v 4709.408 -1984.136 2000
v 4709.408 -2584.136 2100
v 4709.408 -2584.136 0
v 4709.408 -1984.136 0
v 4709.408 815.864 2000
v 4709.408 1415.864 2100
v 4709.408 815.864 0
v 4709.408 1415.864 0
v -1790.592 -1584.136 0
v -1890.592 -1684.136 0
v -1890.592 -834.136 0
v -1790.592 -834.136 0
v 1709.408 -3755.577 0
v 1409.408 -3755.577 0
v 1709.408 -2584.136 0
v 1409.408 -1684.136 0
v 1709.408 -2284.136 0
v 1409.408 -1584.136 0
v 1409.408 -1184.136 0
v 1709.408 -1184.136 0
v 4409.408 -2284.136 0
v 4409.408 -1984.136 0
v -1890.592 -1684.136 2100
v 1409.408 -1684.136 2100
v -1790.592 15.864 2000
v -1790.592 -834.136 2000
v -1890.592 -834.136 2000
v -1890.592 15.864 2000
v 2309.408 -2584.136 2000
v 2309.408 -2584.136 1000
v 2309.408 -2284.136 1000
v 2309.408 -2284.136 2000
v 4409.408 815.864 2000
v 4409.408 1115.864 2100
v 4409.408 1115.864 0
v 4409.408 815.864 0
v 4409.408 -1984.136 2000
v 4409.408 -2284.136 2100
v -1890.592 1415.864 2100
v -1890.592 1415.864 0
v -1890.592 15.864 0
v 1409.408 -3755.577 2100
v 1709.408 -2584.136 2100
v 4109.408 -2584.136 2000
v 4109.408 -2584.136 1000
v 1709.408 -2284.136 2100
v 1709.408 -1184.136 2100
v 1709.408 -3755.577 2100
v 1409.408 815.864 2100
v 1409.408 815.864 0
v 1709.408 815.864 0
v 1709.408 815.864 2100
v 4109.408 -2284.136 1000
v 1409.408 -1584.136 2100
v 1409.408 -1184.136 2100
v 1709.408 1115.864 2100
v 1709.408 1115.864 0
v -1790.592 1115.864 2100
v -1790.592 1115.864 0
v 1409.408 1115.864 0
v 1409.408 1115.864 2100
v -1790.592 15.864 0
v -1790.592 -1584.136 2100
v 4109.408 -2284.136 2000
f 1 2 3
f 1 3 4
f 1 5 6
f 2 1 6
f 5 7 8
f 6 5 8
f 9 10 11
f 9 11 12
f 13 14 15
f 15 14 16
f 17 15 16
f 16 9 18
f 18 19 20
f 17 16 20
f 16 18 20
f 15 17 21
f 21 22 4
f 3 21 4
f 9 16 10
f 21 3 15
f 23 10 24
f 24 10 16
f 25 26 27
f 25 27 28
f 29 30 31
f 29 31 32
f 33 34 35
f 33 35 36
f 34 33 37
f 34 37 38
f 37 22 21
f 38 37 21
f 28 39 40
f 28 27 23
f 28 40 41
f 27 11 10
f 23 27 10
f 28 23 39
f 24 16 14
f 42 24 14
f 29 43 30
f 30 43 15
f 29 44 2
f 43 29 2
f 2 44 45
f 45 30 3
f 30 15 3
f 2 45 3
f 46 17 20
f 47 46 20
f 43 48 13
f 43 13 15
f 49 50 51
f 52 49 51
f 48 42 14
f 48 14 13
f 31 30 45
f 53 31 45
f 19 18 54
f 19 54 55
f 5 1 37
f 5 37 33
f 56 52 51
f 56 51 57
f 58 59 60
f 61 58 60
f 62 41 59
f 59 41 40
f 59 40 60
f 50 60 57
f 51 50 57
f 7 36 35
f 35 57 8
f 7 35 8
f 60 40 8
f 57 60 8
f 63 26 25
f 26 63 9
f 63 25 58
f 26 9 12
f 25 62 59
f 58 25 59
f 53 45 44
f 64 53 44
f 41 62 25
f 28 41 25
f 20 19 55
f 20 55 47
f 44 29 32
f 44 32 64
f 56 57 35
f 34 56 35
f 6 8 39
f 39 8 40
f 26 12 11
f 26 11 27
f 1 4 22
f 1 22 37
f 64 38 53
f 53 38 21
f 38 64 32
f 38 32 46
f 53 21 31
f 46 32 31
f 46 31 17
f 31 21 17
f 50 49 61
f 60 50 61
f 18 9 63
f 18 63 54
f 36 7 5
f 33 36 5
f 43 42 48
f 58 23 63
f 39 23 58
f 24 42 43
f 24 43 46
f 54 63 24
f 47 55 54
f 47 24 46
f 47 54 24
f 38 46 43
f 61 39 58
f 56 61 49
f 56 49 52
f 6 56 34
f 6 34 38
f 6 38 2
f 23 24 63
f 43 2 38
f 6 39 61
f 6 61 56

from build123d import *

# Parameters (mm, degrees)
F0_W     = 3200
F0_H     = 2700
F1_DEPTH = 2100
F2_W     = 300
F2_H     = 2000
F3_DEPTH = 3450
F4_W     = 2800
F4_H     = 2000
F5_DEPTH = 880
F6_W     = 1800
F6_H     = 1000
F7_DEPTH = 700
F8_W     = 850
F8_H     = 2000
F9_DEPTH = 620


with BuildPart() as f1:
    # F0 (on Top) → F1 (new body)
    with BuildSketch(Plane.XY):
        Polygon((1709.408105, 1415.863724), (-1890.591895, 1415.863724), (-1890.591895, -1684.136276), (1409.408105, -1684.136276), (1709.408105, -1684.136276), (1709.408105, 1115.863724), align=None)
        with Locations((-190.591895, -234.136276)):
            Rectangle(F0_W, F0_H, mode=Mode.SUBTRACT)
        Polygon((4709.408105, 1415.863724), (1709.408105, 1415.863724), (1709.408105, 1115.863724), (4409.408105, 1115.863724), (4409.408105, -2284.136276), (1709.408105, -2284.136276), (1709.408105, -2584.136276), (4709.408105, -2584.136276), align=None)
        Polygon((1709.408105, -1684.136276), (1409.408105, -1684.136276), (1409.408105, -3755.577326), (1709.408105, -3755.577326), (1709.408105, -2584.136276), (1709.408105, -2284.136276), align=None)
    extrude(amount=F1_DEPTH)

    # F2 (on face) → F3 (cut)
    with BuildSketch(Plane.XY.offset(2100)):
        with Locations((1559.408105, -184.136276)):
            Rectangle(F2_W, F2_H)
    extrude(amount=-F3_DEPTH, mode=Mode.SUBTRACT)

    # F4 (on face) → F5 (cut)
    with BuildSketch(Plane.YZ.offset(4709.408105)):
        with Locations((-584.136276, 1000)):
            Rectangle(F4_W, F4_H)
    extrude(amount=-F5_DEPTH, mode=Mode.SUBTRACT)

    # F6 (on face) → F7 (cut)
    with BuildSketch(Plane.XZ.offset(2584.136276)):
        with Locations((3209.408105, 1500)):
            Rectangle(F6_W, F6_H)
    extrude(amount=-F7_DEPTH, mode=Mode.SUBTRACT)

    # F8 (on face) → F9 (cut)
    with BuildSketch(Plane.YZ.offset(-1790.591895)):
        with Locations((-409.136276, 1000)):
            Rectangle(F8_W, F8_H)
    extrude(amount=-F9_DEPTH, mode=Mode.SUBTRACT)


solid = f1.part
